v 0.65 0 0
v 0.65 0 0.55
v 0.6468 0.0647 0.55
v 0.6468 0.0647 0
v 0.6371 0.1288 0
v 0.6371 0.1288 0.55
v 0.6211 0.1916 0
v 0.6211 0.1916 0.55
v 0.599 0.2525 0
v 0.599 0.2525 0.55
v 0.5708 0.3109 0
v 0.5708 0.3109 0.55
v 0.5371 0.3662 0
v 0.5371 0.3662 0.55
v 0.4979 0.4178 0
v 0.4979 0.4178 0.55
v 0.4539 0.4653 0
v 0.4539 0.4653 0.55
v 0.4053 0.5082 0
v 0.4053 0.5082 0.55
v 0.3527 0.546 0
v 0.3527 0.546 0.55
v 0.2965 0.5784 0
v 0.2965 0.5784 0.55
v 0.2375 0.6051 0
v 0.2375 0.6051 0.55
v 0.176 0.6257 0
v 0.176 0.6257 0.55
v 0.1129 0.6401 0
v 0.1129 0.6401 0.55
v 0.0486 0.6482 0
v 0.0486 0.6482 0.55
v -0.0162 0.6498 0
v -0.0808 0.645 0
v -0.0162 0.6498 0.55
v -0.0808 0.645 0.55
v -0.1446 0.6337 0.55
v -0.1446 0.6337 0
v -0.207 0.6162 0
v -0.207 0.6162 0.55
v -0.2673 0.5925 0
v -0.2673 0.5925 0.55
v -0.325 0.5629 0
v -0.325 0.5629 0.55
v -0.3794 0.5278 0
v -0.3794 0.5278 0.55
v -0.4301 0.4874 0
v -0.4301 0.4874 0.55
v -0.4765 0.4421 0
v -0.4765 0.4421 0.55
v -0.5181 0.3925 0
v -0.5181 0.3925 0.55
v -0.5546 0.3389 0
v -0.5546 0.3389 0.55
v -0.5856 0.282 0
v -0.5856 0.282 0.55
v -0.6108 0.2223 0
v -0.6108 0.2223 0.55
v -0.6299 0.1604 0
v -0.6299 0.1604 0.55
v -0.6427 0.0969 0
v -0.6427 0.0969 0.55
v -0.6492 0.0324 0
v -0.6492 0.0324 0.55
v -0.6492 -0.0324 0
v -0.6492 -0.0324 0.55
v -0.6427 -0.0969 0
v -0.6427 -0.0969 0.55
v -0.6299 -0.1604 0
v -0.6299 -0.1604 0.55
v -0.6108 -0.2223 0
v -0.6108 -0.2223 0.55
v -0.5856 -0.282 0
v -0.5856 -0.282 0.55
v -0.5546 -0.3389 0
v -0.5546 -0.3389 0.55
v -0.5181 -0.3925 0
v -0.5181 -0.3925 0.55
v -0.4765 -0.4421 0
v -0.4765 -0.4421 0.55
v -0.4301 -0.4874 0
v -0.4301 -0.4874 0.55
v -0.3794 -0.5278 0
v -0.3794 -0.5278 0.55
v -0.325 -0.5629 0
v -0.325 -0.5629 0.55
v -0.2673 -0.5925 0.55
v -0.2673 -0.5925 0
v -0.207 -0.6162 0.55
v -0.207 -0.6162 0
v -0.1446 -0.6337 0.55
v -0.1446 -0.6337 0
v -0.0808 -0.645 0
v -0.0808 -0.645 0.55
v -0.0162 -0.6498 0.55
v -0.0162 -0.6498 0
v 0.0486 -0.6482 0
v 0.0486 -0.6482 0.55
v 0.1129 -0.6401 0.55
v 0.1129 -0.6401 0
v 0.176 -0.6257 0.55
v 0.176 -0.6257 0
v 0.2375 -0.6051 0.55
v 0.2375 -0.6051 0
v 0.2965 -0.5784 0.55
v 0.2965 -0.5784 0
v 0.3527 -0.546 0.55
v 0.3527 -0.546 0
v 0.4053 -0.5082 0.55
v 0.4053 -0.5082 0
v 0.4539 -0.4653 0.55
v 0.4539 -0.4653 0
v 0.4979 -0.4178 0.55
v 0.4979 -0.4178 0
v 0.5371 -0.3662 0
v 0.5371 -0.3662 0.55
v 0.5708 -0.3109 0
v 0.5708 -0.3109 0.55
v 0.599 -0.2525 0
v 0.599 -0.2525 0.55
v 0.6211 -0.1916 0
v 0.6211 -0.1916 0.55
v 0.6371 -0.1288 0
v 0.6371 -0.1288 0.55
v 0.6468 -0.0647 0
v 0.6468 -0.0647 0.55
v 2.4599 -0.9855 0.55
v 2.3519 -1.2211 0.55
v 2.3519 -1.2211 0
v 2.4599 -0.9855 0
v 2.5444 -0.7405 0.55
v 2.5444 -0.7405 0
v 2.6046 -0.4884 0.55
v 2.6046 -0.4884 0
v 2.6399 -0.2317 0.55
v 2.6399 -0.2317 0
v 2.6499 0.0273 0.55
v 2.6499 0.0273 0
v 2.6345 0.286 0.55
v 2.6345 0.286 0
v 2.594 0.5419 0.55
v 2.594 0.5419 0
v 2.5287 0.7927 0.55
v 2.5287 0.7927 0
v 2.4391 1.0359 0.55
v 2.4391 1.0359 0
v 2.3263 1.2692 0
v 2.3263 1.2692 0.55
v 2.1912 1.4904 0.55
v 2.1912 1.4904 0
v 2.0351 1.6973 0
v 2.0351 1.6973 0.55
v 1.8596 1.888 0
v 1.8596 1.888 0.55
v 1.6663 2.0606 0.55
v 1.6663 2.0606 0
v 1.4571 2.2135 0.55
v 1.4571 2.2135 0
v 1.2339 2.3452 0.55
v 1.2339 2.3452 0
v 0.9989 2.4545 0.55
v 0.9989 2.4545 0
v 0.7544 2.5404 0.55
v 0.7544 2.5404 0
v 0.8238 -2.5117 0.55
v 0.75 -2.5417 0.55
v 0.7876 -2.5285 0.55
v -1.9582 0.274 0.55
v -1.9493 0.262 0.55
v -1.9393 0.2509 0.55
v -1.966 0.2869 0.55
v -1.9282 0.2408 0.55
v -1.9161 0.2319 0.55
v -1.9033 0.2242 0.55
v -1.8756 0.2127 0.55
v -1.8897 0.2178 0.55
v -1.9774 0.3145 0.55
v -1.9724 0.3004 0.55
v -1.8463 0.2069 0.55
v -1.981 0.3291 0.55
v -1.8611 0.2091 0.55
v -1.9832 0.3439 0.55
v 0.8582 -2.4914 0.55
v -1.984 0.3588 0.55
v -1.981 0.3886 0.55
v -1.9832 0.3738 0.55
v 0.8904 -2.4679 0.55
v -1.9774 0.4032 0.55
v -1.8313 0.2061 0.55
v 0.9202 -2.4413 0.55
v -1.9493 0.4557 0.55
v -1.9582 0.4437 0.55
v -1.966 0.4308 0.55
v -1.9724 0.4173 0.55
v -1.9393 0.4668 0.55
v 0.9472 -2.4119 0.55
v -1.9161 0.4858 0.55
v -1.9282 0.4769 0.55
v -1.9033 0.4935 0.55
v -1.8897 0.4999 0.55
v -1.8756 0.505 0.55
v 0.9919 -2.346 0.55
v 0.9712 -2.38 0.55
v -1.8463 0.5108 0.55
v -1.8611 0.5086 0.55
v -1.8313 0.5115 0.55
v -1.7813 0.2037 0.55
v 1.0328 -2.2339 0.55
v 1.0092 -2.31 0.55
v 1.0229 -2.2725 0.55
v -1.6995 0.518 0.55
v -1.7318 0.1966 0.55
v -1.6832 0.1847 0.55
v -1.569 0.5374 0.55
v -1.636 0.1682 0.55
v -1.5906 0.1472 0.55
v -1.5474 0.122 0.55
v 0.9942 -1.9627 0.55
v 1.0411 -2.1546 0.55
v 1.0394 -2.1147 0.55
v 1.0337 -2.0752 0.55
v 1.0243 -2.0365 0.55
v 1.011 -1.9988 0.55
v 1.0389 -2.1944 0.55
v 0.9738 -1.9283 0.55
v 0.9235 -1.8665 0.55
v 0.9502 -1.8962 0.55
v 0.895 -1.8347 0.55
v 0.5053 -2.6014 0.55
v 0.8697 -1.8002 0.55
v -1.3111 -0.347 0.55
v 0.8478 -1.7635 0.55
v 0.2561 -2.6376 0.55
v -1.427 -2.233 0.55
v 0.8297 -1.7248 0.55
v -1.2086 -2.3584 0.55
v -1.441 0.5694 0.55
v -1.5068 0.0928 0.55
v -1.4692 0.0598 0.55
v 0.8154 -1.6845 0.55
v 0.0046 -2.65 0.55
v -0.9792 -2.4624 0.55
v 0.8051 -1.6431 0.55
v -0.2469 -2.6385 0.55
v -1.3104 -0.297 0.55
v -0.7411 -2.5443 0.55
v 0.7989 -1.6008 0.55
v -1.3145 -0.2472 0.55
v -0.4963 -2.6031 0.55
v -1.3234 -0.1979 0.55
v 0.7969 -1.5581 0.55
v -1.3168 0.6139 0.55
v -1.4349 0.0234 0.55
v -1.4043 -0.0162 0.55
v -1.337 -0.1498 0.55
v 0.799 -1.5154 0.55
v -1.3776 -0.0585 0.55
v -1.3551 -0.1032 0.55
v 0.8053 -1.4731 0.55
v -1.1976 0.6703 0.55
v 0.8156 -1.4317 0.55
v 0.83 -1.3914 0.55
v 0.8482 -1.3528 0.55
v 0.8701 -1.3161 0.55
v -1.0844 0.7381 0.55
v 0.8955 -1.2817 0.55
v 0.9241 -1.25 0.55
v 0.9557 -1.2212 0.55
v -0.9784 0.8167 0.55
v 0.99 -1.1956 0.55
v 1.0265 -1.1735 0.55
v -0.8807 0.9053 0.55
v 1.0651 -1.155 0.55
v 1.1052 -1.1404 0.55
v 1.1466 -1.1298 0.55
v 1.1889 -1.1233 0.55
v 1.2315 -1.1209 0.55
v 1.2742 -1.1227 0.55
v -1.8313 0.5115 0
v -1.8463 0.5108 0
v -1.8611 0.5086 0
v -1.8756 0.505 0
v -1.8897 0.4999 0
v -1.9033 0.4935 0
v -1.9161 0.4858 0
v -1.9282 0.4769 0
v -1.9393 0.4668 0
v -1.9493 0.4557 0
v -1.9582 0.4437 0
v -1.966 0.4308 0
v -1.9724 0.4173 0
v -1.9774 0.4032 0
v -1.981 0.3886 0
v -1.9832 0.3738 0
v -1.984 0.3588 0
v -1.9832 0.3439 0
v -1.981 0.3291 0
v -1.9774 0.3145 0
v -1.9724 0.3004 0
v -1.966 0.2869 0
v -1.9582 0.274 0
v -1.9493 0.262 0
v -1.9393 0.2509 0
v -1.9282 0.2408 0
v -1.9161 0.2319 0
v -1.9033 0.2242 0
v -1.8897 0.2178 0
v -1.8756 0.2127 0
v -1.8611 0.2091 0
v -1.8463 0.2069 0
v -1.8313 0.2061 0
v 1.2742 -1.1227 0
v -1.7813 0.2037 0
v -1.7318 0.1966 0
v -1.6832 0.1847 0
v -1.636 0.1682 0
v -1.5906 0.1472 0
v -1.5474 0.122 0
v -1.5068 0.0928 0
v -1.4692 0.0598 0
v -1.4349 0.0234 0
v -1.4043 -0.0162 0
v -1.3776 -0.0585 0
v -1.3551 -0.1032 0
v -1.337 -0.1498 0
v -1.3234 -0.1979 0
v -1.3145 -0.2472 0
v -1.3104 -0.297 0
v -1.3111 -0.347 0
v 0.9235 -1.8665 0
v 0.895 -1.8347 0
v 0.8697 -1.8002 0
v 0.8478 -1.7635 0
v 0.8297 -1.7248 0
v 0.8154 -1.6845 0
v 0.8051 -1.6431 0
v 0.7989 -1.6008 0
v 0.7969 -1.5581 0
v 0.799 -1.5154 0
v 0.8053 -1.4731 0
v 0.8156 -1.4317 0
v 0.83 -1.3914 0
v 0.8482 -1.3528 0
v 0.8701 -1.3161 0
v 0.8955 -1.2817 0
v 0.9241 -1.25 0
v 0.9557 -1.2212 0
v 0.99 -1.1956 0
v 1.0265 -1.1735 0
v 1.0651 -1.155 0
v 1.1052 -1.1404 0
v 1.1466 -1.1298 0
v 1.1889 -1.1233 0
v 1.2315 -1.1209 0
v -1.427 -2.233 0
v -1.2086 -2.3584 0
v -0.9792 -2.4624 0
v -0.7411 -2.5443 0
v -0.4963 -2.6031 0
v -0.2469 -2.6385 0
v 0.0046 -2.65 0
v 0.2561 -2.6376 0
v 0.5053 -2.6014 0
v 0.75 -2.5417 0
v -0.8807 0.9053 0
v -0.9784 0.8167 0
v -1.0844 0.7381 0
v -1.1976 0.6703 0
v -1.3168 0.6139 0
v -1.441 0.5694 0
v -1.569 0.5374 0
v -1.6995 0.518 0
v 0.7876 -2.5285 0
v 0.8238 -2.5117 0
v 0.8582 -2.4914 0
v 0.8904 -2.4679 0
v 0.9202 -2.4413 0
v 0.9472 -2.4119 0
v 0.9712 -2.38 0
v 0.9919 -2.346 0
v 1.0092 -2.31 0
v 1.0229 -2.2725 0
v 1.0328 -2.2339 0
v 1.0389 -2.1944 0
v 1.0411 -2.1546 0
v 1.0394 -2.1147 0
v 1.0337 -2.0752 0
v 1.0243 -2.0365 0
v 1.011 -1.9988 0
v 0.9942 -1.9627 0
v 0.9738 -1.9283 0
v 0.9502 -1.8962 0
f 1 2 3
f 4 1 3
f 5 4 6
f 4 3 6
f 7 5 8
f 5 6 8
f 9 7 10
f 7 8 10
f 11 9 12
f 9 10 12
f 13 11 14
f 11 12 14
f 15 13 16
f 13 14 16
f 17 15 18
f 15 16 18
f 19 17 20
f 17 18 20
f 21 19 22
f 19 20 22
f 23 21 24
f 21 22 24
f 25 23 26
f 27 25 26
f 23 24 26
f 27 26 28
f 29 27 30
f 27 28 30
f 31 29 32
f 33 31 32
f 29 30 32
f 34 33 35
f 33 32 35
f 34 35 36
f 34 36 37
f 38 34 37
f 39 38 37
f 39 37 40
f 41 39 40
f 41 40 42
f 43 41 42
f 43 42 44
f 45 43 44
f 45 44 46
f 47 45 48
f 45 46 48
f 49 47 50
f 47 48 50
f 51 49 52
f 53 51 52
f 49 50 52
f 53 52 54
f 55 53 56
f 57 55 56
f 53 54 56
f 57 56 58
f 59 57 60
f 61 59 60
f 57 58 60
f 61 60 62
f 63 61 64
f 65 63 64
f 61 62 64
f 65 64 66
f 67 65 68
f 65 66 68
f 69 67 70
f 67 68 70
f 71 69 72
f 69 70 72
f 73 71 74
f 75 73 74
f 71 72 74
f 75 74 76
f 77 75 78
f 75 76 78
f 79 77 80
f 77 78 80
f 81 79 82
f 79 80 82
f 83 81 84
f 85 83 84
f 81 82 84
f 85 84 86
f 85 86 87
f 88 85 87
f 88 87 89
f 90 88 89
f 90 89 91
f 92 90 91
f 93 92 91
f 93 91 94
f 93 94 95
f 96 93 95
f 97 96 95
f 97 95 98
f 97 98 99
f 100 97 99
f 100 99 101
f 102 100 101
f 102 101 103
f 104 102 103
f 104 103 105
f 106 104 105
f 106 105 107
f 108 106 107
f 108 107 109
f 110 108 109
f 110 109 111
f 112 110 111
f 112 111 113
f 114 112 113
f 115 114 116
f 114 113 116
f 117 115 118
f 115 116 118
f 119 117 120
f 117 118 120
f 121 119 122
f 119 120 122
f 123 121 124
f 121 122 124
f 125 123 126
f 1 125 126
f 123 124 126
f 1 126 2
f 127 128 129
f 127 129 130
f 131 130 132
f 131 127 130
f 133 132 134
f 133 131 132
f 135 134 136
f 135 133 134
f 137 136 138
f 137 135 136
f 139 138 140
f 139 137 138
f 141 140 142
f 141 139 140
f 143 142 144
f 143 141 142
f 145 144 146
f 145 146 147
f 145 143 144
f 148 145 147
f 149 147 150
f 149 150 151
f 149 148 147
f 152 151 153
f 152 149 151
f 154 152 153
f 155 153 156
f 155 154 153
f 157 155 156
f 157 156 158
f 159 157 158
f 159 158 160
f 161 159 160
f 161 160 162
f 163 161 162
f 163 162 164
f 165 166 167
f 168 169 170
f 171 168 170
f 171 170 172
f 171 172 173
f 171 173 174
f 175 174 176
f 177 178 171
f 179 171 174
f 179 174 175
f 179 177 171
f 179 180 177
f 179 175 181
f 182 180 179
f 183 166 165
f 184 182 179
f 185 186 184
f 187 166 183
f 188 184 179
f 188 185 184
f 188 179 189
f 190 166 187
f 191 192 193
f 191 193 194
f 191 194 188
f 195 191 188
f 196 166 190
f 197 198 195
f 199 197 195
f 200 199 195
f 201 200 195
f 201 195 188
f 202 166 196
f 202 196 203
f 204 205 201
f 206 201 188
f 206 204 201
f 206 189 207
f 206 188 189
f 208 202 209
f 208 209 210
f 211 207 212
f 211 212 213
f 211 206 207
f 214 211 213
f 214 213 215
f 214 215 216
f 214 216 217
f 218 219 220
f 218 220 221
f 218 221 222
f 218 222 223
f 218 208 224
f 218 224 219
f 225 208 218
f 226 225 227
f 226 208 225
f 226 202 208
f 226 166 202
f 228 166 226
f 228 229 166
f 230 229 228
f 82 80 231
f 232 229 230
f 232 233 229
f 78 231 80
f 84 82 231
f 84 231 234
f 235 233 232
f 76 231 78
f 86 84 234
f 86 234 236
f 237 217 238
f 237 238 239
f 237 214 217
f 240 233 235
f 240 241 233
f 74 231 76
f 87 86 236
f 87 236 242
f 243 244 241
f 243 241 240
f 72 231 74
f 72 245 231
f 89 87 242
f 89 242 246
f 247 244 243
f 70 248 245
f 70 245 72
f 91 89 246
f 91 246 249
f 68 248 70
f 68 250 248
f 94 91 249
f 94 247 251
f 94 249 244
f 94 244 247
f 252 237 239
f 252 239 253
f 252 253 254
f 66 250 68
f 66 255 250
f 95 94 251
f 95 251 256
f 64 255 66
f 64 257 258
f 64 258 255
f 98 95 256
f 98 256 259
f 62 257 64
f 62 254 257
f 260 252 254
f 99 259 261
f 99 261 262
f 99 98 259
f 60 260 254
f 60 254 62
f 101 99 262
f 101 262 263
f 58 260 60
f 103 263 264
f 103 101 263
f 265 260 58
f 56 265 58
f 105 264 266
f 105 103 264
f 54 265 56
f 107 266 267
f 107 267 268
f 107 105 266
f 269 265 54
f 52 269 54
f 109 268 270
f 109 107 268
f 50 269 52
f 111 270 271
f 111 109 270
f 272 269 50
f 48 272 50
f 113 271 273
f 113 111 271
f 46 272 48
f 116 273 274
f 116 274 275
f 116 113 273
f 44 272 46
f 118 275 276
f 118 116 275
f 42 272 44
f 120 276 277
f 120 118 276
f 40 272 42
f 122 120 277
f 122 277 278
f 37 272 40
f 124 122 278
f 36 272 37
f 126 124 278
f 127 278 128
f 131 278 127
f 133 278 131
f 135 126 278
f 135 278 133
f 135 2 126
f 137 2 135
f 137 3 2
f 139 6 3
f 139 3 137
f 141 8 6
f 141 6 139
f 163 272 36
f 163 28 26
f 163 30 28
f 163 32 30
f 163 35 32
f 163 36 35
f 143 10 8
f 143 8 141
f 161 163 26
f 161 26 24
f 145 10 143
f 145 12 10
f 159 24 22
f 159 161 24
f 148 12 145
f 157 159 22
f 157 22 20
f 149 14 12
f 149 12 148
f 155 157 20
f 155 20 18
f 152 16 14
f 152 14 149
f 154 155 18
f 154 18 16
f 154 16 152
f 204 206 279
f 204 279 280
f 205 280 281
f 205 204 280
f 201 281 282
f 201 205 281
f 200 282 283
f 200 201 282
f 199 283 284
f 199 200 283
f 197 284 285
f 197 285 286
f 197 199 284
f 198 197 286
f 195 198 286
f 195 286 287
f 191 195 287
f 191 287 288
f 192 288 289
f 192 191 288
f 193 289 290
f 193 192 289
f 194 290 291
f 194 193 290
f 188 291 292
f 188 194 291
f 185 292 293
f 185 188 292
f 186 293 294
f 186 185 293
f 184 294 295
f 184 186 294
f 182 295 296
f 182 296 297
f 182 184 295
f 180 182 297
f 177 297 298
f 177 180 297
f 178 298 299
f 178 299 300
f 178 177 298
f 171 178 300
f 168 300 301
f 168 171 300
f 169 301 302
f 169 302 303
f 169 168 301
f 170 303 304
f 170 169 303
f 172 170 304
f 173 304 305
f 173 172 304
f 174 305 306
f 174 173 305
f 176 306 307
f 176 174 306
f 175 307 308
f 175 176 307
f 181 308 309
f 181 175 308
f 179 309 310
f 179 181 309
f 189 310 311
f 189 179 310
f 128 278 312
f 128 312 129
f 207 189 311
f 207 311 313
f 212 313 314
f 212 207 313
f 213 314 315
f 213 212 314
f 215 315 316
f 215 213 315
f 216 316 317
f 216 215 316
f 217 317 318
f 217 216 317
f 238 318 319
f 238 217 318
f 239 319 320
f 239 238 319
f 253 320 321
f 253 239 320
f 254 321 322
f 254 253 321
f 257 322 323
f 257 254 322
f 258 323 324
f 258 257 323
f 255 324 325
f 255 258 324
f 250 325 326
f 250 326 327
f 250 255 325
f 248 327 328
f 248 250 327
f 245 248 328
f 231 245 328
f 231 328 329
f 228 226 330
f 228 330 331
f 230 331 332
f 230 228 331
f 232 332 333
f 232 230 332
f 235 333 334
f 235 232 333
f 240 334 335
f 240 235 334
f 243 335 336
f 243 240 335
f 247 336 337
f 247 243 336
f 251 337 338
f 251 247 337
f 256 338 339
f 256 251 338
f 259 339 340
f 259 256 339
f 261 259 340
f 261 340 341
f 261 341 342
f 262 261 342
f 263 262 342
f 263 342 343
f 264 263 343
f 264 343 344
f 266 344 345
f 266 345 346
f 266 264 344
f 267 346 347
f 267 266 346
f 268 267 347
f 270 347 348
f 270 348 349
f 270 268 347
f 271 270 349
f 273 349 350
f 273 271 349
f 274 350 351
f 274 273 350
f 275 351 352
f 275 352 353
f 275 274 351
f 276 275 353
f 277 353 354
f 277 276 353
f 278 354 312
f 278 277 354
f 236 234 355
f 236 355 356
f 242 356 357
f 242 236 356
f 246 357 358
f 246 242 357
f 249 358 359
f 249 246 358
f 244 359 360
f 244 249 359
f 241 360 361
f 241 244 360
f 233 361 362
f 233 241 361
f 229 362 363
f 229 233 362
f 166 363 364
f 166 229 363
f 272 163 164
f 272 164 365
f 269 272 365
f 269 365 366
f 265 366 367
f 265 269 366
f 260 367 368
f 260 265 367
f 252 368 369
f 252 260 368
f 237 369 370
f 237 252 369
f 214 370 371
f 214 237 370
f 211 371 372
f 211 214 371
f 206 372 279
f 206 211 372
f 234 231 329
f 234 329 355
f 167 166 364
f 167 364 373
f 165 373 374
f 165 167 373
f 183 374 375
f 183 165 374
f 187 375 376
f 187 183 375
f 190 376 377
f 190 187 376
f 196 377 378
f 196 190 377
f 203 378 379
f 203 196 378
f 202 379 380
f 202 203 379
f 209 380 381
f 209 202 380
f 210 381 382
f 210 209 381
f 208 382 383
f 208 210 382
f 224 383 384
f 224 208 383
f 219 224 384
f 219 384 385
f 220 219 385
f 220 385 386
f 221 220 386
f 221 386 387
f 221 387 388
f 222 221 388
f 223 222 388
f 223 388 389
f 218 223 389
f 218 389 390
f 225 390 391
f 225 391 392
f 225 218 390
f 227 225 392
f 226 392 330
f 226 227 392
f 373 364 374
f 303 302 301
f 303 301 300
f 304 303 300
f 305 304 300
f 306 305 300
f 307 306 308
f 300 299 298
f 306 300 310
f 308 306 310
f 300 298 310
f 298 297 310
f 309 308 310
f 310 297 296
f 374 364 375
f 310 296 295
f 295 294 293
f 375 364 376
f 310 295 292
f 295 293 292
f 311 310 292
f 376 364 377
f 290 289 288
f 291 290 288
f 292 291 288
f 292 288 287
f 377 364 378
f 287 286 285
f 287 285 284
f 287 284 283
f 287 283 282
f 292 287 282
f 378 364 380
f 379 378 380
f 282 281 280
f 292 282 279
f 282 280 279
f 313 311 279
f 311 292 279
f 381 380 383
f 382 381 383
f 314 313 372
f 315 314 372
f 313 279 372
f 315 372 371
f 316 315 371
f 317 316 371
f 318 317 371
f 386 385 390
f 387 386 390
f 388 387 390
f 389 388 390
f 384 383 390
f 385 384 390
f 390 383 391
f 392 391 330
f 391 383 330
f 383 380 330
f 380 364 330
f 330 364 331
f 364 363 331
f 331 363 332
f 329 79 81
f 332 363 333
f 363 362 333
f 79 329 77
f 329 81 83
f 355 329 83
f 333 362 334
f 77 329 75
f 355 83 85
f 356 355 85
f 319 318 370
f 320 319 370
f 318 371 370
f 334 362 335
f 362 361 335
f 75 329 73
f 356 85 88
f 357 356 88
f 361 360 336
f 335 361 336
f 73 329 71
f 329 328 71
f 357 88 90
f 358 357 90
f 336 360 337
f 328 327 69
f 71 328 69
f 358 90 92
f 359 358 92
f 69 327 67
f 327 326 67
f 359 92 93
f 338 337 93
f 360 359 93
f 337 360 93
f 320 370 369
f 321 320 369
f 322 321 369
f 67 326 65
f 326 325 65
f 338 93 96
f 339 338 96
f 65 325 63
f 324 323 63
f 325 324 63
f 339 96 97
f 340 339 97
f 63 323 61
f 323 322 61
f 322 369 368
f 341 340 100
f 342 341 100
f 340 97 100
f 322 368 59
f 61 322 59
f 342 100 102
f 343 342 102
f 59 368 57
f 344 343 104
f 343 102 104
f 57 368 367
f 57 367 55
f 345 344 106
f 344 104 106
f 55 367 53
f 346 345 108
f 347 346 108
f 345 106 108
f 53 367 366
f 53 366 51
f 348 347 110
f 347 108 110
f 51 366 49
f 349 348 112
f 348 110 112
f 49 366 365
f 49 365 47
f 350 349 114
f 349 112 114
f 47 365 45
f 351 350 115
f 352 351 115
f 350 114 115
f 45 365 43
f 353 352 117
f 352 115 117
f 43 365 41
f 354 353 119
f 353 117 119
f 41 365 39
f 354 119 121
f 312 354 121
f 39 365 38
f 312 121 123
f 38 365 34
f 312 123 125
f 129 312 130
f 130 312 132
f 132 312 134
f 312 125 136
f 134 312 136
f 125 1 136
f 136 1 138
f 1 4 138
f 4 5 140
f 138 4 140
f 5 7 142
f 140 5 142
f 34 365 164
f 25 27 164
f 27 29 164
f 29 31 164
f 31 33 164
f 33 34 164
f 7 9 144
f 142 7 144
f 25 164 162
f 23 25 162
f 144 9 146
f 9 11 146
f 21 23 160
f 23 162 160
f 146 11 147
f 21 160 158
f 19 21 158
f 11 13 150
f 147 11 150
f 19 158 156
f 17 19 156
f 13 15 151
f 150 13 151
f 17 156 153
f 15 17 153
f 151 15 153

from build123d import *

# Parameters (mm, degrees)
SKETCH1_R           = 0.65
BOSS_EXTRUDE1_DEPTH = 0.55


with BuildPart() as part:
    # Sketch1 → Boss-Extrude1 (new body)
    with BuildSketch(Plane.XY.offset(0.55)):
        with BuildLine():
            Line((1.274233088, -1.122718337), (2.351911214, -1.221070694))
            ThreePointArc((2.351911214, -1.221070694), (2.439127121, 1.035933823), (0.754376305, 2.540357532))
            Line((0.754376305, 2.540357532), (-0.880678776, 0.905302451))
            ThreePointArc((-0.880678776, 0.905302451), (-1.316819724, 0.613882386), (-1.831283051, 0.511549267))
            ThreePointArc((-1.831283051, 0.511549267), (-1.983983424, 0.358848894), (-1.831283051, 0.20614852))
            ThreePointArc((-1.831283051, 0.20614852), (-1.451603036, 0.042010969), (-1.311061008, -0.347021148))
            Line((-1.311061008, -0.347021148), (-1.426950301, -2.233005338))
            ThreePointArc((-1.426950301, -2.233005338), (-0.372010152, -2.623758458), (0.749973232, -2.541660904))
            ThreePointArc((0.749973232, -2.541660904), (1.02832185, -2.253308059), (0.923549505, -1.866464328))
            ThreePointArc((0.923549505, -1.866464328), (0.838647067, -1.371883608), (1.274233088, -1.122718337))
        make_face()
        Circle(SKETCH1_R, mode=Mode.SUBTRACT)
    extrude(amount=-BOSS_EXTRUDE1_DEPTH)


solid = part.part
